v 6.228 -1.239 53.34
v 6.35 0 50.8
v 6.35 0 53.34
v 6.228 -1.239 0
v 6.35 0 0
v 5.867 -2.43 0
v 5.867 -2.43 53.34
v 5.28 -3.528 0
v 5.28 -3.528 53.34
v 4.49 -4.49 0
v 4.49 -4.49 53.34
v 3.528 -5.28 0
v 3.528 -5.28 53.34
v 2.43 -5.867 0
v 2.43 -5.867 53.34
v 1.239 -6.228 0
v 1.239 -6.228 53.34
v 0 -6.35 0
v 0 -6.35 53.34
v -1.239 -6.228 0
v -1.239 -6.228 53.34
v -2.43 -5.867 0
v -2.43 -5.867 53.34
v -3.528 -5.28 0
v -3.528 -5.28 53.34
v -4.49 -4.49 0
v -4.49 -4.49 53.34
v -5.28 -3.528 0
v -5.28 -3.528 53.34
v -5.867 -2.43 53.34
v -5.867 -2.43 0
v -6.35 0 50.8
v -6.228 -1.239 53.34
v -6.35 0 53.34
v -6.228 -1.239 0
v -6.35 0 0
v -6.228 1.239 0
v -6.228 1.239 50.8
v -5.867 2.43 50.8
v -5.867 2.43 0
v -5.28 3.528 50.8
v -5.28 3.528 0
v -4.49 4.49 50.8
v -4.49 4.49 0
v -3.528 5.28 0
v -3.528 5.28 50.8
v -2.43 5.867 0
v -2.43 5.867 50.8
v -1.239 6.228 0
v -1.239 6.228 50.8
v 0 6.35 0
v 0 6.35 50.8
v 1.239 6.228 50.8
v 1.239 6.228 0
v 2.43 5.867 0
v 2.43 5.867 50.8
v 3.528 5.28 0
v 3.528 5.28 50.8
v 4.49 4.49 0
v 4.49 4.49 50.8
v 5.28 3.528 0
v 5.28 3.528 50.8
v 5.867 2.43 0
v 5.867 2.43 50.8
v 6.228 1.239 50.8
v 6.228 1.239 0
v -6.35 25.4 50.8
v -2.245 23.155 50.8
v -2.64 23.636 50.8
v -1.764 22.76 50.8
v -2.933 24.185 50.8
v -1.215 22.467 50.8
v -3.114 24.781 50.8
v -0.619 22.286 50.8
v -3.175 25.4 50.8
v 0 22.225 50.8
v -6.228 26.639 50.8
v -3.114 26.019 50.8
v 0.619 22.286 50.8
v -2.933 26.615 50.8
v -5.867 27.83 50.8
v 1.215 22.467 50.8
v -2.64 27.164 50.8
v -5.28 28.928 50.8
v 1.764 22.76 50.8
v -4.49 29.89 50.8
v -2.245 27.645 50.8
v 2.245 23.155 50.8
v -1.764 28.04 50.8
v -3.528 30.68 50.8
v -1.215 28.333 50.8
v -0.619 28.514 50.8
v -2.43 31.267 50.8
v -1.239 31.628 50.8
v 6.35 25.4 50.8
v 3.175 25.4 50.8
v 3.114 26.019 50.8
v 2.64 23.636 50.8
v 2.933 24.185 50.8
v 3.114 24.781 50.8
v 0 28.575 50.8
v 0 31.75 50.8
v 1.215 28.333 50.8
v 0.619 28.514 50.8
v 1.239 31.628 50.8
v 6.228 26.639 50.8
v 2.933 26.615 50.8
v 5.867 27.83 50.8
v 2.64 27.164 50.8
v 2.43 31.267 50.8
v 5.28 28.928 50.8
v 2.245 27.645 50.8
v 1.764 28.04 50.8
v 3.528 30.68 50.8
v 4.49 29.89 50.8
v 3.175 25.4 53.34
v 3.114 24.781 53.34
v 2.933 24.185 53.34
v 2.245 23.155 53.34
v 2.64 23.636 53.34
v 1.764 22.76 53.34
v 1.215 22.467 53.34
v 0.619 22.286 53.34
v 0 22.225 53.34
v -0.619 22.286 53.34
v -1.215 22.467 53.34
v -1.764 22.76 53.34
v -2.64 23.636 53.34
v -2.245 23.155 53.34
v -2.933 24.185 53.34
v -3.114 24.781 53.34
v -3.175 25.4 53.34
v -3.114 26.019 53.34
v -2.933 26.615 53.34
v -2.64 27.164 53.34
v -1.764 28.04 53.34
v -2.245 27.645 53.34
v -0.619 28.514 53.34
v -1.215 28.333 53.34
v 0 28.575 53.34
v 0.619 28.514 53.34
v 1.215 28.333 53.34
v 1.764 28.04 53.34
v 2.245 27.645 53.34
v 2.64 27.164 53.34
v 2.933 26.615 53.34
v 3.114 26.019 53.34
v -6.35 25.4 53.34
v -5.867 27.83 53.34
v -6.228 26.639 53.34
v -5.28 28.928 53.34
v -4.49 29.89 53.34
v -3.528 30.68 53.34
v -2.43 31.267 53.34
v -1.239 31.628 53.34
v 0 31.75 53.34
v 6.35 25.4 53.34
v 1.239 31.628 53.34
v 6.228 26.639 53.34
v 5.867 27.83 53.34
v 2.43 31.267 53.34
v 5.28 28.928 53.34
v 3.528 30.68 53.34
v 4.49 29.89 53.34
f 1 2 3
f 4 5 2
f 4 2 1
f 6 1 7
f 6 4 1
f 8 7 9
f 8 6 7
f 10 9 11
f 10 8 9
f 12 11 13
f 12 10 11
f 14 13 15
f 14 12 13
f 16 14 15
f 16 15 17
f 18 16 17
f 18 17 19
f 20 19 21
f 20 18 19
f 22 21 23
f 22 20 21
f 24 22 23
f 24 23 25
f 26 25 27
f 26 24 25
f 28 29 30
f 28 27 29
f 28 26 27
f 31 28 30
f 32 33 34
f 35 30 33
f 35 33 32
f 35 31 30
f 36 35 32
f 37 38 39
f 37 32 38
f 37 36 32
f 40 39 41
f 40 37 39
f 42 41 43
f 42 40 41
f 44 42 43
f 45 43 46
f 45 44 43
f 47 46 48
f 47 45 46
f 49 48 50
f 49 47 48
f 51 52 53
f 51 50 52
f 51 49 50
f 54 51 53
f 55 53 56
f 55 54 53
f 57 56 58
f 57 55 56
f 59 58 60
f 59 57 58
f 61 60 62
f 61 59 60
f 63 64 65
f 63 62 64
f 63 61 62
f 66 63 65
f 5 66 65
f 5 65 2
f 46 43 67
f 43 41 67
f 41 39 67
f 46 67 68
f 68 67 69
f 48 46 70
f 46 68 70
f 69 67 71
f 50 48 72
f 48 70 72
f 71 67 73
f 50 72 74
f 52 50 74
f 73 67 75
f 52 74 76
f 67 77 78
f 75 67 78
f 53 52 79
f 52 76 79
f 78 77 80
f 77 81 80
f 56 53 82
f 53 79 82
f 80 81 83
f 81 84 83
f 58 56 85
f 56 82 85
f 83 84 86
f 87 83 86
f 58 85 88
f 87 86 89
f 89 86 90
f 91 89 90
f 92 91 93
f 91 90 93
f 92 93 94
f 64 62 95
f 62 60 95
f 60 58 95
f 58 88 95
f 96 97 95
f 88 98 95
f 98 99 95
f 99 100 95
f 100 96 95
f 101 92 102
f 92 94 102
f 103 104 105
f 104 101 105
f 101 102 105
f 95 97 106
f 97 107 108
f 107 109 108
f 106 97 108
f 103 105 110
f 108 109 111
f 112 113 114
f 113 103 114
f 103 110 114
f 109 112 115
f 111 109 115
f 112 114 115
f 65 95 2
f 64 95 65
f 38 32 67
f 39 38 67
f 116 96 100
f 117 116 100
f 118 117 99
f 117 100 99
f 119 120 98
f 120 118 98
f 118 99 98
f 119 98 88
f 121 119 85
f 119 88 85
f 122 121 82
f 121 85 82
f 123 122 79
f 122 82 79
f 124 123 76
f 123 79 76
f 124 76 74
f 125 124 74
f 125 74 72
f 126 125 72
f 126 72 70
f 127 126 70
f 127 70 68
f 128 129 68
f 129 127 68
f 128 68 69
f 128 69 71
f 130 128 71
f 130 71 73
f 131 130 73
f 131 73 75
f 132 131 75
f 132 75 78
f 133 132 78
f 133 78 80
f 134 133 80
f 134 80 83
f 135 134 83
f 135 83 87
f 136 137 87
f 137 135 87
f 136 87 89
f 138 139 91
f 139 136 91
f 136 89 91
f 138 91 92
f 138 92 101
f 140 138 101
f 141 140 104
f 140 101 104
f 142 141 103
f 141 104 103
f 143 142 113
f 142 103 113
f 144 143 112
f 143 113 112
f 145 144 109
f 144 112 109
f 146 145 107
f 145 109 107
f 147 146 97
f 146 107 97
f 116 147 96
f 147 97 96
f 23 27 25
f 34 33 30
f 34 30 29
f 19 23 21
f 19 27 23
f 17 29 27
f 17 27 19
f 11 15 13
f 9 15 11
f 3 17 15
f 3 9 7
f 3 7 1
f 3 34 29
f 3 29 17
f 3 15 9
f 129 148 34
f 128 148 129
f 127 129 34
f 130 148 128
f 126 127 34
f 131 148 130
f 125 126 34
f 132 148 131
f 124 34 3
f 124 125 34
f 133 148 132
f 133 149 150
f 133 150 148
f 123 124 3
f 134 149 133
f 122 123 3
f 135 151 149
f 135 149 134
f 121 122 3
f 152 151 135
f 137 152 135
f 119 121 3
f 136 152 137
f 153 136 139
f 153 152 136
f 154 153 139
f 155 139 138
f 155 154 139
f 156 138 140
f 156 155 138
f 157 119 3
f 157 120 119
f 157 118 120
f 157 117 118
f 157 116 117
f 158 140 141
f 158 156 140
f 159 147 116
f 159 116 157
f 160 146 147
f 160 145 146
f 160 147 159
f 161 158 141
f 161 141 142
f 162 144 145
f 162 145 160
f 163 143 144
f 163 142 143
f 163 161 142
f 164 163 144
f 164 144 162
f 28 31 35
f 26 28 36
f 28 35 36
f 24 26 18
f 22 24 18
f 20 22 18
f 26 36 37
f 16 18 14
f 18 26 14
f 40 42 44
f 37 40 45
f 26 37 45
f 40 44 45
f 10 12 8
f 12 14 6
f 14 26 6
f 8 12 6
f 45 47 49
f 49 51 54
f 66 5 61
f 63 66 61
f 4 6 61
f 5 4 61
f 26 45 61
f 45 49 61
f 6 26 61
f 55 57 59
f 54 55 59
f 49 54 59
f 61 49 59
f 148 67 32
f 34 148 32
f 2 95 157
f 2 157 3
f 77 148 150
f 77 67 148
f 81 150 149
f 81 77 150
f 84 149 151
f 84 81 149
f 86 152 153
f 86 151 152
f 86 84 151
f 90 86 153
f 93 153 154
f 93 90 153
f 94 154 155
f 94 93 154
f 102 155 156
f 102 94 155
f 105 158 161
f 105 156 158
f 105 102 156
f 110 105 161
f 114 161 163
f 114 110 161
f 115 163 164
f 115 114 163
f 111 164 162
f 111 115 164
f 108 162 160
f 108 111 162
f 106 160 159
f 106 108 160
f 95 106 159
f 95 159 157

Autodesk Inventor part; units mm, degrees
ref_plane "YZ Plane" through (0, 0, 0) normal (1, 0, 0) x (0, 1, 0)
ref_plane "XZ Plane" through (0, 0, 0) normal (0, 1, 0) x (-1, 0, 0)
ref_plane "XY Plane" through (0, 0, 0) normal (0, 0, 1) x (1, 0, 0)
sketch "Sketch1" plane through (0, 0, 0) normal (0, 0, 1) x (1, 0, 0)
  circle A0 centre (0, 0) radius 6.35
  dimension "d0" = 12.7
extrude "Extrusion1" add sketch "Sketch1" along normal blind 50.8
sketch "Sketch2" plane through (0, 0, 50.8) normal (0, 0, 1) x (1, 0, 0)
  circle A0 centre (0, 0) radius 6.35 projected
  line L0 (0, 0) -> (0, 25.4)
  circle A1 centre (0, 25.4) radius 6.35
  line L1 (-6.35, 25.4) -> (-6.35, 0)
  line L2 (6.35, 25.4) -> (6.35, 0)
  circle A2 centre (0, 25.4) radius 3.175
  dimension "d3" = 25.4
  dimension "d6" = 6.35
extrude "Extrusion2" add sketch "Sketch2" along normal blind 2.54
properties part number "main rack connection"
